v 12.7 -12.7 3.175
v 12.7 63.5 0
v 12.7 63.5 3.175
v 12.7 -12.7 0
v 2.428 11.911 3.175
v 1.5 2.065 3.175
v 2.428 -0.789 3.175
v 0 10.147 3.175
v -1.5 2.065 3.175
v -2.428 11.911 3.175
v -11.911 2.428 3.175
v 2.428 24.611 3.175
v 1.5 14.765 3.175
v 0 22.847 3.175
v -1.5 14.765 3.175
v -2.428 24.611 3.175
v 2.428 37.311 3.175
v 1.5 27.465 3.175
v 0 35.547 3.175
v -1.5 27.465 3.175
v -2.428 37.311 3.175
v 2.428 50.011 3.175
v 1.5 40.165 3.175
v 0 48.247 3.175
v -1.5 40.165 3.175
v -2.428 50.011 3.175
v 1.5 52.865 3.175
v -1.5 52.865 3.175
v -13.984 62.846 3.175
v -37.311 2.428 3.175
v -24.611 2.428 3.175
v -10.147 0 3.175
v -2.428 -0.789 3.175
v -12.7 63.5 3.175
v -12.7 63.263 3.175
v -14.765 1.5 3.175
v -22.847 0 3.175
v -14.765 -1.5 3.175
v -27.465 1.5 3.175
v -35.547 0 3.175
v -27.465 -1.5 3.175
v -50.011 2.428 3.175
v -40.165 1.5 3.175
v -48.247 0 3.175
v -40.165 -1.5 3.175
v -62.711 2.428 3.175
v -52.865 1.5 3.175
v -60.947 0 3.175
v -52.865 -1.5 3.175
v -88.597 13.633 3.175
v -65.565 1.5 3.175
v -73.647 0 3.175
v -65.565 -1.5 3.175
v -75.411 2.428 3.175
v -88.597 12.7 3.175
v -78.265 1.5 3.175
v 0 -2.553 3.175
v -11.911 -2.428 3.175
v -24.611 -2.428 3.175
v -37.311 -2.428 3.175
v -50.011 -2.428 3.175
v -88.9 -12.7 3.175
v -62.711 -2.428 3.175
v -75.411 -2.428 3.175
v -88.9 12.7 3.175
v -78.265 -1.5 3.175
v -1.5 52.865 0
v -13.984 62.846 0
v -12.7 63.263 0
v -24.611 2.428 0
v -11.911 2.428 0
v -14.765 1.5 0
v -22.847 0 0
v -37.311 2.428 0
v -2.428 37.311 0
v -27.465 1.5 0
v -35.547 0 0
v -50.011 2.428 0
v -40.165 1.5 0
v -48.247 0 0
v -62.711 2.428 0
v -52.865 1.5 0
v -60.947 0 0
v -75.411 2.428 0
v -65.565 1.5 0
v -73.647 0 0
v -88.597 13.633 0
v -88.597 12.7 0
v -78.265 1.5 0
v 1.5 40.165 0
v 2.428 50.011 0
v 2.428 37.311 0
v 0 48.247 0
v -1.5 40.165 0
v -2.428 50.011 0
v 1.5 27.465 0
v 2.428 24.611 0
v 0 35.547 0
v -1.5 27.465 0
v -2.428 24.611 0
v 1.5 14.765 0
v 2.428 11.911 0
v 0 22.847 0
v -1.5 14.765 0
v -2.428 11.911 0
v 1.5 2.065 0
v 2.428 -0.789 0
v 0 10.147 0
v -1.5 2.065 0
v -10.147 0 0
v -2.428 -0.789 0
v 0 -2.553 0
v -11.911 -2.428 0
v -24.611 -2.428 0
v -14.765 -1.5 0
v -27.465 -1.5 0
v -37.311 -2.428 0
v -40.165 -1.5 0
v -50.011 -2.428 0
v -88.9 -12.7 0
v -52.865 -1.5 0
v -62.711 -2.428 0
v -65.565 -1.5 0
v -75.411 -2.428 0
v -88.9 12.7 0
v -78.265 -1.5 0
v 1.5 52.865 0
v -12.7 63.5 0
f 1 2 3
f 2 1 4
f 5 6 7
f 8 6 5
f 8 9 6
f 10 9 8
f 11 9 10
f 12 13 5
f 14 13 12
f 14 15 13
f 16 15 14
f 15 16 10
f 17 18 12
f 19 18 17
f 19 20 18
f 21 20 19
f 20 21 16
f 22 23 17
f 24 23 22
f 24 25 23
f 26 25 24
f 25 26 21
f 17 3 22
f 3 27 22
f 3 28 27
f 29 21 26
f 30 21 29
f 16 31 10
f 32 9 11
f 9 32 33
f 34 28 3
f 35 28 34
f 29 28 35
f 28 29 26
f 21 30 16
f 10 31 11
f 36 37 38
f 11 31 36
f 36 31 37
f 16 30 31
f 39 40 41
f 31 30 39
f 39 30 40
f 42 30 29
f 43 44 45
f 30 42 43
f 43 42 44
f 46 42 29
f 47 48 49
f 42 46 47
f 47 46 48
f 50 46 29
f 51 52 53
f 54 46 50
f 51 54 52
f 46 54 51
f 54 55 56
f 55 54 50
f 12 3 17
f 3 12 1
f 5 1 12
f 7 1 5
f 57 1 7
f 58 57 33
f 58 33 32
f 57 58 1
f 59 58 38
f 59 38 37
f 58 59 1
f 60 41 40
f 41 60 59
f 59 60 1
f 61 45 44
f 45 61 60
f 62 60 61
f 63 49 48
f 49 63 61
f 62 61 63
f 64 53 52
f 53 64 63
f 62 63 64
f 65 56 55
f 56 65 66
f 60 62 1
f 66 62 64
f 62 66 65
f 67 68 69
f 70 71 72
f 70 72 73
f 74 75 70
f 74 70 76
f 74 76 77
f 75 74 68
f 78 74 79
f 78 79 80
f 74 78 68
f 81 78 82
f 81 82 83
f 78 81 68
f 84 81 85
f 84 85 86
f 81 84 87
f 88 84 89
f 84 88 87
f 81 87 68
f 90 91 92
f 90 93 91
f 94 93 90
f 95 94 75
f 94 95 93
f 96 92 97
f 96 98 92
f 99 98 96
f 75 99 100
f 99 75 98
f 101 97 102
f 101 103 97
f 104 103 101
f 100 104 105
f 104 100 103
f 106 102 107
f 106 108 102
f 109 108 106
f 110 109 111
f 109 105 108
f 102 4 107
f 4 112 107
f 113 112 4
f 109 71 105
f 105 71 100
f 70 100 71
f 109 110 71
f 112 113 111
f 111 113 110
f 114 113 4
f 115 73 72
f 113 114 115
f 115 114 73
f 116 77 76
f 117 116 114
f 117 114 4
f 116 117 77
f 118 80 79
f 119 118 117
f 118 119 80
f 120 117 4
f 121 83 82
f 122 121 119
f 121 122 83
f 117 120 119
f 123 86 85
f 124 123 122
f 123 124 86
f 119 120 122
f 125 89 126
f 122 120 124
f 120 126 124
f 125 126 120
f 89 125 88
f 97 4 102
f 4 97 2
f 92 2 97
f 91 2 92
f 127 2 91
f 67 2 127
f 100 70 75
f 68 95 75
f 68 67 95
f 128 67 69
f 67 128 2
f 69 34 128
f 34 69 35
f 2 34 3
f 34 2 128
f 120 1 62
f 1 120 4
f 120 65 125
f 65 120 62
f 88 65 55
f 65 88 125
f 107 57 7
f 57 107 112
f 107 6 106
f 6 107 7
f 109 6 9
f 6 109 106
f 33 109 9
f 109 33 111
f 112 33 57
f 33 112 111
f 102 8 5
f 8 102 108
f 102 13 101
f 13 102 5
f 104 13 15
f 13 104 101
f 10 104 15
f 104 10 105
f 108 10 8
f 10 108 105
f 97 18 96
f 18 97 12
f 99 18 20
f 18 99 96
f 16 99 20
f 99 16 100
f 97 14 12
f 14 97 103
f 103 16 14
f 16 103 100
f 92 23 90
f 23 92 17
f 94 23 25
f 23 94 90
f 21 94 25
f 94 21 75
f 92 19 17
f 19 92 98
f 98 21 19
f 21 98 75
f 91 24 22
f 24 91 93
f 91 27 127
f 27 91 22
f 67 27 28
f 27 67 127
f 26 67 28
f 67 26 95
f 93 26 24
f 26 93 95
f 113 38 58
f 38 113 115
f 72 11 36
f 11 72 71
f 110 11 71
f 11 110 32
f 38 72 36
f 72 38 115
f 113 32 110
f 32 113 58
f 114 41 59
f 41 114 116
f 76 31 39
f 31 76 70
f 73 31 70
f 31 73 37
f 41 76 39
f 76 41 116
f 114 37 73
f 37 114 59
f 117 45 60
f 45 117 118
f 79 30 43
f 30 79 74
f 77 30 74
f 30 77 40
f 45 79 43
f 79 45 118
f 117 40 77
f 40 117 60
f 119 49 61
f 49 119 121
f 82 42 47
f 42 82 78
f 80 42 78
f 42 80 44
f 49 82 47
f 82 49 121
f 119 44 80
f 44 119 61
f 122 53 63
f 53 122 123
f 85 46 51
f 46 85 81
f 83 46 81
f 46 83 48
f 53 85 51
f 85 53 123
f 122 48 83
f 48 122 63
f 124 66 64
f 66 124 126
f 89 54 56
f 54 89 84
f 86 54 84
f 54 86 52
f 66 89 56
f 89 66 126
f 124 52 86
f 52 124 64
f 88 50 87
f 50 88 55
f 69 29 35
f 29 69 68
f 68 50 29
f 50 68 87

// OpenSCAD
/*[1836 Standard Plate]*/
//The angle between the two parts of the plate:
Angle = 90; //[0:180]
//The thickness of the plate:
PlateThickness = .125;
//The width of the plate:
PlateWidth = 1;
//The plate's length in one direction:
PlateLengthY = 3;
//The plate's length in the other direction:
PlateLengthX = 3;
/*[Hole Pattern]*/
//The plate's hole pattern spacing in one direction:
HolePatternY = .5;
//The plate's hole pattern spacing in the other direction (may not work if angle is not 90):
HolePatternX = .5;
//The size of the holes:
HoleSize = .201;
/*[Crossmember]*/
//Toggle between crossmember on or off (may not work if angle is not 90):
Crossmember = "On"; //[On, Off]
//Fillet radius of crossmember:
Radius = 0.125;
/*[hidden]*/
holes = 0;

module Plate() {
    union() {
        scale(25.4, 25.4, 25.4) translate([-PlateWidth/2, -PlateWidth/2, 0])
            cube([PlateWidth, PlateLengthY, PlateThickness]);
        scale(25.4, 25.4, 25.4) translate([-PlateWidth/2, -PlateWidth/2, 0])rotate(a = Angle)
            cube([PlateWidth, PlateLengthX, PlateThickness]);
    }
}
module PlateWithHolePattern() {
    difference() {
        Plate();
        if(HolePatternX+HolePatternY>0) {
            for (holes =[0:HolePatternY:PlateLengthY-HolePatternY-PlateWidth/2]) {
           scale([25.4, 25.4, 25.4]) rotate(a = -90) translate ([-holes, 0, 0])
               cylinder(d = HoleSize, h = PlateThickness);
            }
            for (holes =[HolePatternX:HolePatternX:PlateLengthX+HolePatternX-PlateWidth/2]) {
           translate([0, 0, 0]) {
               if (holes > HolePatternX) {
               scale([25.4, 25.4, 25.4]) rotate(a = Angle+270) translate ([-holes, 0, 0]) 
               cylinder(d = HoleSize, h = PlateThickness);
                   } 
               else {scale([25.4, 25.4, 25.4]) translate([-holes, 0, 0]) 
               cylinder(d = HoleSize, h = PlateThickness);
            }
            }
    } }
}
}

module PlateWithCrossmember() {
    union() {
        PlateWithHolePattern();
        if(Crossmember == "On") {
                hull() {
                    scale([25.4, 25.4, 25.4]) translate([-PlateWidth/2, PlateWidth/2, 0])
                        cylinder(h = PlateThickness, d = Radius);
                    scale([25.4, 25.4, 25.4]) translate([-PlateWidth/2-PlateLengthX+Radius/2, PlateWidth/2, 0])
                        cylinder(h = PlateThickness, d = Radius);
                    scale([25.4, 25.4, 25.4]) translate([-PlateWidth/2, -PlateWidth/2+PlateLengthY-Radius/2, 0])
                        cylinder(h = PlateThickness, d = Radius);
                    
                }
            }
        }
    }

PlateWithCrossmember();



        
        
        
        
        
        
